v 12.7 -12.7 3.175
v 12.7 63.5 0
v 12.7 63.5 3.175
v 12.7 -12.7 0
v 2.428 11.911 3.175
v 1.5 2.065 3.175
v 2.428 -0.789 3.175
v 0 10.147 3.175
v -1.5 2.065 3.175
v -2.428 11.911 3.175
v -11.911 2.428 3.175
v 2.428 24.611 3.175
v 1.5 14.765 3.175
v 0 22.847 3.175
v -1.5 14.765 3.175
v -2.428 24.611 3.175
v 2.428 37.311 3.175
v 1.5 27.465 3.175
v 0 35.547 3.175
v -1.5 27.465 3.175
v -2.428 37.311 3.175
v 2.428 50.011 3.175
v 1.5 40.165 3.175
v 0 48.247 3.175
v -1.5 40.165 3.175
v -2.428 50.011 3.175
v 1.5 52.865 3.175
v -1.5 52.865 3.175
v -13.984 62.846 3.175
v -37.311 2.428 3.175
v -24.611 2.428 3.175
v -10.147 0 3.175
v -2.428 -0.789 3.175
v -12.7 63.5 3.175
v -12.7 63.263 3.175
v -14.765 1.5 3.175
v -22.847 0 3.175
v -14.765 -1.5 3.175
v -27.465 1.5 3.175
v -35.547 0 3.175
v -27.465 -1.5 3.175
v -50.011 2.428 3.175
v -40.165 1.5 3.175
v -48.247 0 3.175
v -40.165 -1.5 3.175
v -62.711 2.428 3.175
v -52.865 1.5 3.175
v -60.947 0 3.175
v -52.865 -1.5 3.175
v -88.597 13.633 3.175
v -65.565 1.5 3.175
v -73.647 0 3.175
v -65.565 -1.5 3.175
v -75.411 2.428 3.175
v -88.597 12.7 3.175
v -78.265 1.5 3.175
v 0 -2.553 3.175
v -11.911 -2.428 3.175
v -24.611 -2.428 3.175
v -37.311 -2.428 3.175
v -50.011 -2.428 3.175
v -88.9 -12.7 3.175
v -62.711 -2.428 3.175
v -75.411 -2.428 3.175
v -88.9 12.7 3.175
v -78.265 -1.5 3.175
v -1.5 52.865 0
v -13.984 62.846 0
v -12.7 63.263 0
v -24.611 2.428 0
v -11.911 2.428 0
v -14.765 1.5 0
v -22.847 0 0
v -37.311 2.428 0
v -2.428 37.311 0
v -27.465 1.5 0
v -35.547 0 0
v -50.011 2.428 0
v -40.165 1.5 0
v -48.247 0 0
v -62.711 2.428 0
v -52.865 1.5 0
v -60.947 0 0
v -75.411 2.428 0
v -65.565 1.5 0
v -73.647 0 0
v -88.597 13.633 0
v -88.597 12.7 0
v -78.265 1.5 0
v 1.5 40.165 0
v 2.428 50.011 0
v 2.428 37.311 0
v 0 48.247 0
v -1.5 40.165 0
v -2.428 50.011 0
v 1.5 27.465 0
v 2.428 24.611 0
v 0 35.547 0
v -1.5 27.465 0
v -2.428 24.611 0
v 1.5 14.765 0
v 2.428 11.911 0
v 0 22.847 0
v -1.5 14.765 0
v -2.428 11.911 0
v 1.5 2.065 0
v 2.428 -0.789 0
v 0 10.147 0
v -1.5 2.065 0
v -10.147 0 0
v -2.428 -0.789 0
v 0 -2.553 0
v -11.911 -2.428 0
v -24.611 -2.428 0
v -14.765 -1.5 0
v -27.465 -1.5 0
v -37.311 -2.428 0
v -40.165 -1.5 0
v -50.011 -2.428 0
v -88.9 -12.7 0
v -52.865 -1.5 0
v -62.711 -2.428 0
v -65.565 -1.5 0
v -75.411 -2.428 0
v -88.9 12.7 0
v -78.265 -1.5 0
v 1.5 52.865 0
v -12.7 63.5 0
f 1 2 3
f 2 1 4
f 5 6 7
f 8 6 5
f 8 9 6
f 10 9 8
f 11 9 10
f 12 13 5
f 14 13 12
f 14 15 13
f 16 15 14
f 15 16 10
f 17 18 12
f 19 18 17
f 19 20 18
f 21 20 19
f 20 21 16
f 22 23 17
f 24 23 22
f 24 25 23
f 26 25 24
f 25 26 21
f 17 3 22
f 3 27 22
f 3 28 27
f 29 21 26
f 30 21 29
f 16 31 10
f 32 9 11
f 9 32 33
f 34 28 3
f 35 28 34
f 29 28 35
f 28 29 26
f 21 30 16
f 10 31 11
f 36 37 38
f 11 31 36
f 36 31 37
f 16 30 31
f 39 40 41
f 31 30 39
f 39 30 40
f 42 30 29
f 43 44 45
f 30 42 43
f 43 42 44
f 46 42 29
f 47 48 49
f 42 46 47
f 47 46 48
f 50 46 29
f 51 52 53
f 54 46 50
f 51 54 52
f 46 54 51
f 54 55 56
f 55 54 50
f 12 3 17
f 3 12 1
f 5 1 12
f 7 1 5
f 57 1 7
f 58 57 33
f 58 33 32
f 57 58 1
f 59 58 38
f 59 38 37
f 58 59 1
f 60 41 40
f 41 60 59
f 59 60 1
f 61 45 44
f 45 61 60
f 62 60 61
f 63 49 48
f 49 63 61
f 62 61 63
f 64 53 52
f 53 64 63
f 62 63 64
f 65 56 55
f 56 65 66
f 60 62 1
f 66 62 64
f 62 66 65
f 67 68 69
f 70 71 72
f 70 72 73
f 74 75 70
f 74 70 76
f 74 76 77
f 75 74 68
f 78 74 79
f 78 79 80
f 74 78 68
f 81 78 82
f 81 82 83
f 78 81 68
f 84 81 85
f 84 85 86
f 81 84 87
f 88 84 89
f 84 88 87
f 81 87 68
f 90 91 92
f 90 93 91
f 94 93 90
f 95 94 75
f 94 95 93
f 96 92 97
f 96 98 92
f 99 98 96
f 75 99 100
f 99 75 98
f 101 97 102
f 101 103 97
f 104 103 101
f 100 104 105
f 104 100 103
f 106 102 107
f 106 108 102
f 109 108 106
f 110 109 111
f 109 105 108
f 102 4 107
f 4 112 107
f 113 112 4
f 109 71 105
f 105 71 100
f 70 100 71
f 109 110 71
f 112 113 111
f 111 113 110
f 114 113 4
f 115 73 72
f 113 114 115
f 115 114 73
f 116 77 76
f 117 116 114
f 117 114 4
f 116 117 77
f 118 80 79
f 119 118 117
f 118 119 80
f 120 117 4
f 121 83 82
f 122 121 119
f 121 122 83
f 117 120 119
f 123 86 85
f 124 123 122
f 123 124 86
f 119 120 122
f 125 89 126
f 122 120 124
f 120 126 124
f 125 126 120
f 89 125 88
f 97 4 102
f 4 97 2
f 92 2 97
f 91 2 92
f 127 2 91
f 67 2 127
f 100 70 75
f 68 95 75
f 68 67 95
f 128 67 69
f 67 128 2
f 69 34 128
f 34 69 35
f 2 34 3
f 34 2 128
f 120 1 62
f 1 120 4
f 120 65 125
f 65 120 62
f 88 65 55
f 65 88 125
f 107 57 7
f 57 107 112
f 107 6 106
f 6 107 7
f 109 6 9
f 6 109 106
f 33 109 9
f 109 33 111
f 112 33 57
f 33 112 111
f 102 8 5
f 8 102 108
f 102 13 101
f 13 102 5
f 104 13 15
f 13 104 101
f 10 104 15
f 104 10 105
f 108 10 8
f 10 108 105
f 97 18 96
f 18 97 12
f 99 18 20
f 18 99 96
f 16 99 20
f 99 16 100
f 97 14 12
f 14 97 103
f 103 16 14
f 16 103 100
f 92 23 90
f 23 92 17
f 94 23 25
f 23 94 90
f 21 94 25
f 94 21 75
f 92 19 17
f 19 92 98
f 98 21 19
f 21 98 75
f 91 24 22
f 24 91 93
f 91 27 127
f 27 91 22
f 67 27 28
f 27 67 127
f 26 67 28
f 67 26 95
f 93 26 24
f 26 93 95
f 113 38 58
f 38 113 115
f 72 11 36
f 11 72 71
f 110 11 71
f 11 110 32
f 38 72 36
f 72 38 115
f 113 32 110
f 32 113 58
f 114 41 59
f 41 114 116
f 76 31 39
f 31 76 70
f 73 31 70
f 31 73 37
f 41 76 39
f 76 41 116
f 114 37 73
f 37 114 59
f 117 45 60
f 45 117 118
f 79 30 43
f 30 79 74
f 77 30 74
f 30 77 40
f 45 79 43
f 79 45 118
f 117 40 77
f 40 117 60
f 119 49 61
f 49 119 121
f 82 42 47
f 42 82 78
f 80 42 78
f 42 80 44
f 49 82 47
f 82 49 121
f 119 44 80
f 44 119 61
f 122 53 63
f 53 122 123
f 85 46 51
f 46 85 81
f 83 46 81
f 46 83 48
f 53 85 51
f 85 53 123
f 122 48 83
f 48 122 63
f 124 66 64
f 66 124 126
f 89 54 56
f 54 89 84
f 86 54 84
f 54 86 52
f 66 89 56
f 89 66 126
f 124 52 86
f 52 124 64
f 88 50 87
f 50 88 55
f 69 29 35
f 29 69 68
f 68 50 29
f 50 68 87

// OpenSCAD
/*[1836 Standard Plate]*/
//The angle between the two parts of the plate:
Angle = 90; //[0:180]
//The thickness of the plate:
PlateThickness = .125;
//The width of the plate:
PlateWidth = 1;
//The plate's length in one direction:
PlateLengthY = 3;
//The plate's length in the other direction:
PlateLengthX = 3;
/*[Hole Pattern]*/
//The plate's hole pattern spacing in one direction:
HolePatternY = .5;
//The plate's hole pattern spacing in the other direction (may not work if angle is not 90):
HolePatternX = .5;
//The size of the holes:
HoleSize = .201;
/*[Crossmember]*/
//Toggle between crossmember on or off (may not work if angle is not 90):
Crossmember = "On"; //[On, Off]
//Fillet radius of crossmember:
Radius = 0.125;
/*[hidden]*/
holes = 0;

module Plate() {
    union() {
        scale(25.4, 25.4, 25.4) translate([-PlateWidth/2, -PlateWidth/2, 0])
            cube([PlateWidth, PlateLengthY, PlateThickness]);
        scale(25.4, 25.4, 25.4) translate([-PlateWidth/2, -PlateWidth/2, 0])rotate(a = Angle)
            cube([PlateWidth, PlateLengthX, PlateThickness]);
    }
}
module PlateWithHolePattern() {
    difference() {
        Plate();
        if(HolePatternX+HolePatternY>0) {
            for (holes =[0:HolePatternY:PlateLengthY-HolePatternY-PlateWidth/2]) {
           scale([25.4, 25.4, 25.4]) rotate(a = -90) translate ([-holes, 0, 0])
               cylinder(d = HoleSize, h = PlateThickness);
            }
            for (holes =[HolePatternX:HolePatternX:PlateLengthX+HolePatternX-PlateWidth/2]) {
           translate([0, 0, 0]) {
               if (holes > HolePatternX) {
               scale([25.4, 25.4, 25.4]) rotate(a = Angle+270) translate ([-holes, 0, 0]) 
               cylinder(d = HoleSize, h = PlateThickness);
                   } 
               else {scale([25.4, 25.4, 25.4]) translate([-holes, 0, 0]) 
               cylinder(d = HoleSize, h = PlateThickness);
            }
            }
    } }
}
}

module PlateWithCrossmember() {
    union() {
        PlateWithHolePattern();
        if(Crossmember == "On") {
                hull() {
                    scale([25.4, 25.4, 25.4]) translate([-PlateWidth/2, PlateWidth/2, 0])
                        cylinder(h = PlateThickness, d = Radius);
                    scale([25.4, 25.4, 25.4]) translate([-PlateWidth/2-PlateLengthX+Radius/2, PlateWidth/2, 0])
                        cylinder(h = PlateThickness, d = Radius);
                    scale([25.4, 25.4, 25.4]) translate([-PlateWidth/2, -PlateWidth/2+PlateLengthY-Radius/2, 0])
                        cylinder(h = PlateThickness, d = Radius);
                    
                }
            }
        }
    }

PlateWithCrossmember();



        
        
        
        
        
        
